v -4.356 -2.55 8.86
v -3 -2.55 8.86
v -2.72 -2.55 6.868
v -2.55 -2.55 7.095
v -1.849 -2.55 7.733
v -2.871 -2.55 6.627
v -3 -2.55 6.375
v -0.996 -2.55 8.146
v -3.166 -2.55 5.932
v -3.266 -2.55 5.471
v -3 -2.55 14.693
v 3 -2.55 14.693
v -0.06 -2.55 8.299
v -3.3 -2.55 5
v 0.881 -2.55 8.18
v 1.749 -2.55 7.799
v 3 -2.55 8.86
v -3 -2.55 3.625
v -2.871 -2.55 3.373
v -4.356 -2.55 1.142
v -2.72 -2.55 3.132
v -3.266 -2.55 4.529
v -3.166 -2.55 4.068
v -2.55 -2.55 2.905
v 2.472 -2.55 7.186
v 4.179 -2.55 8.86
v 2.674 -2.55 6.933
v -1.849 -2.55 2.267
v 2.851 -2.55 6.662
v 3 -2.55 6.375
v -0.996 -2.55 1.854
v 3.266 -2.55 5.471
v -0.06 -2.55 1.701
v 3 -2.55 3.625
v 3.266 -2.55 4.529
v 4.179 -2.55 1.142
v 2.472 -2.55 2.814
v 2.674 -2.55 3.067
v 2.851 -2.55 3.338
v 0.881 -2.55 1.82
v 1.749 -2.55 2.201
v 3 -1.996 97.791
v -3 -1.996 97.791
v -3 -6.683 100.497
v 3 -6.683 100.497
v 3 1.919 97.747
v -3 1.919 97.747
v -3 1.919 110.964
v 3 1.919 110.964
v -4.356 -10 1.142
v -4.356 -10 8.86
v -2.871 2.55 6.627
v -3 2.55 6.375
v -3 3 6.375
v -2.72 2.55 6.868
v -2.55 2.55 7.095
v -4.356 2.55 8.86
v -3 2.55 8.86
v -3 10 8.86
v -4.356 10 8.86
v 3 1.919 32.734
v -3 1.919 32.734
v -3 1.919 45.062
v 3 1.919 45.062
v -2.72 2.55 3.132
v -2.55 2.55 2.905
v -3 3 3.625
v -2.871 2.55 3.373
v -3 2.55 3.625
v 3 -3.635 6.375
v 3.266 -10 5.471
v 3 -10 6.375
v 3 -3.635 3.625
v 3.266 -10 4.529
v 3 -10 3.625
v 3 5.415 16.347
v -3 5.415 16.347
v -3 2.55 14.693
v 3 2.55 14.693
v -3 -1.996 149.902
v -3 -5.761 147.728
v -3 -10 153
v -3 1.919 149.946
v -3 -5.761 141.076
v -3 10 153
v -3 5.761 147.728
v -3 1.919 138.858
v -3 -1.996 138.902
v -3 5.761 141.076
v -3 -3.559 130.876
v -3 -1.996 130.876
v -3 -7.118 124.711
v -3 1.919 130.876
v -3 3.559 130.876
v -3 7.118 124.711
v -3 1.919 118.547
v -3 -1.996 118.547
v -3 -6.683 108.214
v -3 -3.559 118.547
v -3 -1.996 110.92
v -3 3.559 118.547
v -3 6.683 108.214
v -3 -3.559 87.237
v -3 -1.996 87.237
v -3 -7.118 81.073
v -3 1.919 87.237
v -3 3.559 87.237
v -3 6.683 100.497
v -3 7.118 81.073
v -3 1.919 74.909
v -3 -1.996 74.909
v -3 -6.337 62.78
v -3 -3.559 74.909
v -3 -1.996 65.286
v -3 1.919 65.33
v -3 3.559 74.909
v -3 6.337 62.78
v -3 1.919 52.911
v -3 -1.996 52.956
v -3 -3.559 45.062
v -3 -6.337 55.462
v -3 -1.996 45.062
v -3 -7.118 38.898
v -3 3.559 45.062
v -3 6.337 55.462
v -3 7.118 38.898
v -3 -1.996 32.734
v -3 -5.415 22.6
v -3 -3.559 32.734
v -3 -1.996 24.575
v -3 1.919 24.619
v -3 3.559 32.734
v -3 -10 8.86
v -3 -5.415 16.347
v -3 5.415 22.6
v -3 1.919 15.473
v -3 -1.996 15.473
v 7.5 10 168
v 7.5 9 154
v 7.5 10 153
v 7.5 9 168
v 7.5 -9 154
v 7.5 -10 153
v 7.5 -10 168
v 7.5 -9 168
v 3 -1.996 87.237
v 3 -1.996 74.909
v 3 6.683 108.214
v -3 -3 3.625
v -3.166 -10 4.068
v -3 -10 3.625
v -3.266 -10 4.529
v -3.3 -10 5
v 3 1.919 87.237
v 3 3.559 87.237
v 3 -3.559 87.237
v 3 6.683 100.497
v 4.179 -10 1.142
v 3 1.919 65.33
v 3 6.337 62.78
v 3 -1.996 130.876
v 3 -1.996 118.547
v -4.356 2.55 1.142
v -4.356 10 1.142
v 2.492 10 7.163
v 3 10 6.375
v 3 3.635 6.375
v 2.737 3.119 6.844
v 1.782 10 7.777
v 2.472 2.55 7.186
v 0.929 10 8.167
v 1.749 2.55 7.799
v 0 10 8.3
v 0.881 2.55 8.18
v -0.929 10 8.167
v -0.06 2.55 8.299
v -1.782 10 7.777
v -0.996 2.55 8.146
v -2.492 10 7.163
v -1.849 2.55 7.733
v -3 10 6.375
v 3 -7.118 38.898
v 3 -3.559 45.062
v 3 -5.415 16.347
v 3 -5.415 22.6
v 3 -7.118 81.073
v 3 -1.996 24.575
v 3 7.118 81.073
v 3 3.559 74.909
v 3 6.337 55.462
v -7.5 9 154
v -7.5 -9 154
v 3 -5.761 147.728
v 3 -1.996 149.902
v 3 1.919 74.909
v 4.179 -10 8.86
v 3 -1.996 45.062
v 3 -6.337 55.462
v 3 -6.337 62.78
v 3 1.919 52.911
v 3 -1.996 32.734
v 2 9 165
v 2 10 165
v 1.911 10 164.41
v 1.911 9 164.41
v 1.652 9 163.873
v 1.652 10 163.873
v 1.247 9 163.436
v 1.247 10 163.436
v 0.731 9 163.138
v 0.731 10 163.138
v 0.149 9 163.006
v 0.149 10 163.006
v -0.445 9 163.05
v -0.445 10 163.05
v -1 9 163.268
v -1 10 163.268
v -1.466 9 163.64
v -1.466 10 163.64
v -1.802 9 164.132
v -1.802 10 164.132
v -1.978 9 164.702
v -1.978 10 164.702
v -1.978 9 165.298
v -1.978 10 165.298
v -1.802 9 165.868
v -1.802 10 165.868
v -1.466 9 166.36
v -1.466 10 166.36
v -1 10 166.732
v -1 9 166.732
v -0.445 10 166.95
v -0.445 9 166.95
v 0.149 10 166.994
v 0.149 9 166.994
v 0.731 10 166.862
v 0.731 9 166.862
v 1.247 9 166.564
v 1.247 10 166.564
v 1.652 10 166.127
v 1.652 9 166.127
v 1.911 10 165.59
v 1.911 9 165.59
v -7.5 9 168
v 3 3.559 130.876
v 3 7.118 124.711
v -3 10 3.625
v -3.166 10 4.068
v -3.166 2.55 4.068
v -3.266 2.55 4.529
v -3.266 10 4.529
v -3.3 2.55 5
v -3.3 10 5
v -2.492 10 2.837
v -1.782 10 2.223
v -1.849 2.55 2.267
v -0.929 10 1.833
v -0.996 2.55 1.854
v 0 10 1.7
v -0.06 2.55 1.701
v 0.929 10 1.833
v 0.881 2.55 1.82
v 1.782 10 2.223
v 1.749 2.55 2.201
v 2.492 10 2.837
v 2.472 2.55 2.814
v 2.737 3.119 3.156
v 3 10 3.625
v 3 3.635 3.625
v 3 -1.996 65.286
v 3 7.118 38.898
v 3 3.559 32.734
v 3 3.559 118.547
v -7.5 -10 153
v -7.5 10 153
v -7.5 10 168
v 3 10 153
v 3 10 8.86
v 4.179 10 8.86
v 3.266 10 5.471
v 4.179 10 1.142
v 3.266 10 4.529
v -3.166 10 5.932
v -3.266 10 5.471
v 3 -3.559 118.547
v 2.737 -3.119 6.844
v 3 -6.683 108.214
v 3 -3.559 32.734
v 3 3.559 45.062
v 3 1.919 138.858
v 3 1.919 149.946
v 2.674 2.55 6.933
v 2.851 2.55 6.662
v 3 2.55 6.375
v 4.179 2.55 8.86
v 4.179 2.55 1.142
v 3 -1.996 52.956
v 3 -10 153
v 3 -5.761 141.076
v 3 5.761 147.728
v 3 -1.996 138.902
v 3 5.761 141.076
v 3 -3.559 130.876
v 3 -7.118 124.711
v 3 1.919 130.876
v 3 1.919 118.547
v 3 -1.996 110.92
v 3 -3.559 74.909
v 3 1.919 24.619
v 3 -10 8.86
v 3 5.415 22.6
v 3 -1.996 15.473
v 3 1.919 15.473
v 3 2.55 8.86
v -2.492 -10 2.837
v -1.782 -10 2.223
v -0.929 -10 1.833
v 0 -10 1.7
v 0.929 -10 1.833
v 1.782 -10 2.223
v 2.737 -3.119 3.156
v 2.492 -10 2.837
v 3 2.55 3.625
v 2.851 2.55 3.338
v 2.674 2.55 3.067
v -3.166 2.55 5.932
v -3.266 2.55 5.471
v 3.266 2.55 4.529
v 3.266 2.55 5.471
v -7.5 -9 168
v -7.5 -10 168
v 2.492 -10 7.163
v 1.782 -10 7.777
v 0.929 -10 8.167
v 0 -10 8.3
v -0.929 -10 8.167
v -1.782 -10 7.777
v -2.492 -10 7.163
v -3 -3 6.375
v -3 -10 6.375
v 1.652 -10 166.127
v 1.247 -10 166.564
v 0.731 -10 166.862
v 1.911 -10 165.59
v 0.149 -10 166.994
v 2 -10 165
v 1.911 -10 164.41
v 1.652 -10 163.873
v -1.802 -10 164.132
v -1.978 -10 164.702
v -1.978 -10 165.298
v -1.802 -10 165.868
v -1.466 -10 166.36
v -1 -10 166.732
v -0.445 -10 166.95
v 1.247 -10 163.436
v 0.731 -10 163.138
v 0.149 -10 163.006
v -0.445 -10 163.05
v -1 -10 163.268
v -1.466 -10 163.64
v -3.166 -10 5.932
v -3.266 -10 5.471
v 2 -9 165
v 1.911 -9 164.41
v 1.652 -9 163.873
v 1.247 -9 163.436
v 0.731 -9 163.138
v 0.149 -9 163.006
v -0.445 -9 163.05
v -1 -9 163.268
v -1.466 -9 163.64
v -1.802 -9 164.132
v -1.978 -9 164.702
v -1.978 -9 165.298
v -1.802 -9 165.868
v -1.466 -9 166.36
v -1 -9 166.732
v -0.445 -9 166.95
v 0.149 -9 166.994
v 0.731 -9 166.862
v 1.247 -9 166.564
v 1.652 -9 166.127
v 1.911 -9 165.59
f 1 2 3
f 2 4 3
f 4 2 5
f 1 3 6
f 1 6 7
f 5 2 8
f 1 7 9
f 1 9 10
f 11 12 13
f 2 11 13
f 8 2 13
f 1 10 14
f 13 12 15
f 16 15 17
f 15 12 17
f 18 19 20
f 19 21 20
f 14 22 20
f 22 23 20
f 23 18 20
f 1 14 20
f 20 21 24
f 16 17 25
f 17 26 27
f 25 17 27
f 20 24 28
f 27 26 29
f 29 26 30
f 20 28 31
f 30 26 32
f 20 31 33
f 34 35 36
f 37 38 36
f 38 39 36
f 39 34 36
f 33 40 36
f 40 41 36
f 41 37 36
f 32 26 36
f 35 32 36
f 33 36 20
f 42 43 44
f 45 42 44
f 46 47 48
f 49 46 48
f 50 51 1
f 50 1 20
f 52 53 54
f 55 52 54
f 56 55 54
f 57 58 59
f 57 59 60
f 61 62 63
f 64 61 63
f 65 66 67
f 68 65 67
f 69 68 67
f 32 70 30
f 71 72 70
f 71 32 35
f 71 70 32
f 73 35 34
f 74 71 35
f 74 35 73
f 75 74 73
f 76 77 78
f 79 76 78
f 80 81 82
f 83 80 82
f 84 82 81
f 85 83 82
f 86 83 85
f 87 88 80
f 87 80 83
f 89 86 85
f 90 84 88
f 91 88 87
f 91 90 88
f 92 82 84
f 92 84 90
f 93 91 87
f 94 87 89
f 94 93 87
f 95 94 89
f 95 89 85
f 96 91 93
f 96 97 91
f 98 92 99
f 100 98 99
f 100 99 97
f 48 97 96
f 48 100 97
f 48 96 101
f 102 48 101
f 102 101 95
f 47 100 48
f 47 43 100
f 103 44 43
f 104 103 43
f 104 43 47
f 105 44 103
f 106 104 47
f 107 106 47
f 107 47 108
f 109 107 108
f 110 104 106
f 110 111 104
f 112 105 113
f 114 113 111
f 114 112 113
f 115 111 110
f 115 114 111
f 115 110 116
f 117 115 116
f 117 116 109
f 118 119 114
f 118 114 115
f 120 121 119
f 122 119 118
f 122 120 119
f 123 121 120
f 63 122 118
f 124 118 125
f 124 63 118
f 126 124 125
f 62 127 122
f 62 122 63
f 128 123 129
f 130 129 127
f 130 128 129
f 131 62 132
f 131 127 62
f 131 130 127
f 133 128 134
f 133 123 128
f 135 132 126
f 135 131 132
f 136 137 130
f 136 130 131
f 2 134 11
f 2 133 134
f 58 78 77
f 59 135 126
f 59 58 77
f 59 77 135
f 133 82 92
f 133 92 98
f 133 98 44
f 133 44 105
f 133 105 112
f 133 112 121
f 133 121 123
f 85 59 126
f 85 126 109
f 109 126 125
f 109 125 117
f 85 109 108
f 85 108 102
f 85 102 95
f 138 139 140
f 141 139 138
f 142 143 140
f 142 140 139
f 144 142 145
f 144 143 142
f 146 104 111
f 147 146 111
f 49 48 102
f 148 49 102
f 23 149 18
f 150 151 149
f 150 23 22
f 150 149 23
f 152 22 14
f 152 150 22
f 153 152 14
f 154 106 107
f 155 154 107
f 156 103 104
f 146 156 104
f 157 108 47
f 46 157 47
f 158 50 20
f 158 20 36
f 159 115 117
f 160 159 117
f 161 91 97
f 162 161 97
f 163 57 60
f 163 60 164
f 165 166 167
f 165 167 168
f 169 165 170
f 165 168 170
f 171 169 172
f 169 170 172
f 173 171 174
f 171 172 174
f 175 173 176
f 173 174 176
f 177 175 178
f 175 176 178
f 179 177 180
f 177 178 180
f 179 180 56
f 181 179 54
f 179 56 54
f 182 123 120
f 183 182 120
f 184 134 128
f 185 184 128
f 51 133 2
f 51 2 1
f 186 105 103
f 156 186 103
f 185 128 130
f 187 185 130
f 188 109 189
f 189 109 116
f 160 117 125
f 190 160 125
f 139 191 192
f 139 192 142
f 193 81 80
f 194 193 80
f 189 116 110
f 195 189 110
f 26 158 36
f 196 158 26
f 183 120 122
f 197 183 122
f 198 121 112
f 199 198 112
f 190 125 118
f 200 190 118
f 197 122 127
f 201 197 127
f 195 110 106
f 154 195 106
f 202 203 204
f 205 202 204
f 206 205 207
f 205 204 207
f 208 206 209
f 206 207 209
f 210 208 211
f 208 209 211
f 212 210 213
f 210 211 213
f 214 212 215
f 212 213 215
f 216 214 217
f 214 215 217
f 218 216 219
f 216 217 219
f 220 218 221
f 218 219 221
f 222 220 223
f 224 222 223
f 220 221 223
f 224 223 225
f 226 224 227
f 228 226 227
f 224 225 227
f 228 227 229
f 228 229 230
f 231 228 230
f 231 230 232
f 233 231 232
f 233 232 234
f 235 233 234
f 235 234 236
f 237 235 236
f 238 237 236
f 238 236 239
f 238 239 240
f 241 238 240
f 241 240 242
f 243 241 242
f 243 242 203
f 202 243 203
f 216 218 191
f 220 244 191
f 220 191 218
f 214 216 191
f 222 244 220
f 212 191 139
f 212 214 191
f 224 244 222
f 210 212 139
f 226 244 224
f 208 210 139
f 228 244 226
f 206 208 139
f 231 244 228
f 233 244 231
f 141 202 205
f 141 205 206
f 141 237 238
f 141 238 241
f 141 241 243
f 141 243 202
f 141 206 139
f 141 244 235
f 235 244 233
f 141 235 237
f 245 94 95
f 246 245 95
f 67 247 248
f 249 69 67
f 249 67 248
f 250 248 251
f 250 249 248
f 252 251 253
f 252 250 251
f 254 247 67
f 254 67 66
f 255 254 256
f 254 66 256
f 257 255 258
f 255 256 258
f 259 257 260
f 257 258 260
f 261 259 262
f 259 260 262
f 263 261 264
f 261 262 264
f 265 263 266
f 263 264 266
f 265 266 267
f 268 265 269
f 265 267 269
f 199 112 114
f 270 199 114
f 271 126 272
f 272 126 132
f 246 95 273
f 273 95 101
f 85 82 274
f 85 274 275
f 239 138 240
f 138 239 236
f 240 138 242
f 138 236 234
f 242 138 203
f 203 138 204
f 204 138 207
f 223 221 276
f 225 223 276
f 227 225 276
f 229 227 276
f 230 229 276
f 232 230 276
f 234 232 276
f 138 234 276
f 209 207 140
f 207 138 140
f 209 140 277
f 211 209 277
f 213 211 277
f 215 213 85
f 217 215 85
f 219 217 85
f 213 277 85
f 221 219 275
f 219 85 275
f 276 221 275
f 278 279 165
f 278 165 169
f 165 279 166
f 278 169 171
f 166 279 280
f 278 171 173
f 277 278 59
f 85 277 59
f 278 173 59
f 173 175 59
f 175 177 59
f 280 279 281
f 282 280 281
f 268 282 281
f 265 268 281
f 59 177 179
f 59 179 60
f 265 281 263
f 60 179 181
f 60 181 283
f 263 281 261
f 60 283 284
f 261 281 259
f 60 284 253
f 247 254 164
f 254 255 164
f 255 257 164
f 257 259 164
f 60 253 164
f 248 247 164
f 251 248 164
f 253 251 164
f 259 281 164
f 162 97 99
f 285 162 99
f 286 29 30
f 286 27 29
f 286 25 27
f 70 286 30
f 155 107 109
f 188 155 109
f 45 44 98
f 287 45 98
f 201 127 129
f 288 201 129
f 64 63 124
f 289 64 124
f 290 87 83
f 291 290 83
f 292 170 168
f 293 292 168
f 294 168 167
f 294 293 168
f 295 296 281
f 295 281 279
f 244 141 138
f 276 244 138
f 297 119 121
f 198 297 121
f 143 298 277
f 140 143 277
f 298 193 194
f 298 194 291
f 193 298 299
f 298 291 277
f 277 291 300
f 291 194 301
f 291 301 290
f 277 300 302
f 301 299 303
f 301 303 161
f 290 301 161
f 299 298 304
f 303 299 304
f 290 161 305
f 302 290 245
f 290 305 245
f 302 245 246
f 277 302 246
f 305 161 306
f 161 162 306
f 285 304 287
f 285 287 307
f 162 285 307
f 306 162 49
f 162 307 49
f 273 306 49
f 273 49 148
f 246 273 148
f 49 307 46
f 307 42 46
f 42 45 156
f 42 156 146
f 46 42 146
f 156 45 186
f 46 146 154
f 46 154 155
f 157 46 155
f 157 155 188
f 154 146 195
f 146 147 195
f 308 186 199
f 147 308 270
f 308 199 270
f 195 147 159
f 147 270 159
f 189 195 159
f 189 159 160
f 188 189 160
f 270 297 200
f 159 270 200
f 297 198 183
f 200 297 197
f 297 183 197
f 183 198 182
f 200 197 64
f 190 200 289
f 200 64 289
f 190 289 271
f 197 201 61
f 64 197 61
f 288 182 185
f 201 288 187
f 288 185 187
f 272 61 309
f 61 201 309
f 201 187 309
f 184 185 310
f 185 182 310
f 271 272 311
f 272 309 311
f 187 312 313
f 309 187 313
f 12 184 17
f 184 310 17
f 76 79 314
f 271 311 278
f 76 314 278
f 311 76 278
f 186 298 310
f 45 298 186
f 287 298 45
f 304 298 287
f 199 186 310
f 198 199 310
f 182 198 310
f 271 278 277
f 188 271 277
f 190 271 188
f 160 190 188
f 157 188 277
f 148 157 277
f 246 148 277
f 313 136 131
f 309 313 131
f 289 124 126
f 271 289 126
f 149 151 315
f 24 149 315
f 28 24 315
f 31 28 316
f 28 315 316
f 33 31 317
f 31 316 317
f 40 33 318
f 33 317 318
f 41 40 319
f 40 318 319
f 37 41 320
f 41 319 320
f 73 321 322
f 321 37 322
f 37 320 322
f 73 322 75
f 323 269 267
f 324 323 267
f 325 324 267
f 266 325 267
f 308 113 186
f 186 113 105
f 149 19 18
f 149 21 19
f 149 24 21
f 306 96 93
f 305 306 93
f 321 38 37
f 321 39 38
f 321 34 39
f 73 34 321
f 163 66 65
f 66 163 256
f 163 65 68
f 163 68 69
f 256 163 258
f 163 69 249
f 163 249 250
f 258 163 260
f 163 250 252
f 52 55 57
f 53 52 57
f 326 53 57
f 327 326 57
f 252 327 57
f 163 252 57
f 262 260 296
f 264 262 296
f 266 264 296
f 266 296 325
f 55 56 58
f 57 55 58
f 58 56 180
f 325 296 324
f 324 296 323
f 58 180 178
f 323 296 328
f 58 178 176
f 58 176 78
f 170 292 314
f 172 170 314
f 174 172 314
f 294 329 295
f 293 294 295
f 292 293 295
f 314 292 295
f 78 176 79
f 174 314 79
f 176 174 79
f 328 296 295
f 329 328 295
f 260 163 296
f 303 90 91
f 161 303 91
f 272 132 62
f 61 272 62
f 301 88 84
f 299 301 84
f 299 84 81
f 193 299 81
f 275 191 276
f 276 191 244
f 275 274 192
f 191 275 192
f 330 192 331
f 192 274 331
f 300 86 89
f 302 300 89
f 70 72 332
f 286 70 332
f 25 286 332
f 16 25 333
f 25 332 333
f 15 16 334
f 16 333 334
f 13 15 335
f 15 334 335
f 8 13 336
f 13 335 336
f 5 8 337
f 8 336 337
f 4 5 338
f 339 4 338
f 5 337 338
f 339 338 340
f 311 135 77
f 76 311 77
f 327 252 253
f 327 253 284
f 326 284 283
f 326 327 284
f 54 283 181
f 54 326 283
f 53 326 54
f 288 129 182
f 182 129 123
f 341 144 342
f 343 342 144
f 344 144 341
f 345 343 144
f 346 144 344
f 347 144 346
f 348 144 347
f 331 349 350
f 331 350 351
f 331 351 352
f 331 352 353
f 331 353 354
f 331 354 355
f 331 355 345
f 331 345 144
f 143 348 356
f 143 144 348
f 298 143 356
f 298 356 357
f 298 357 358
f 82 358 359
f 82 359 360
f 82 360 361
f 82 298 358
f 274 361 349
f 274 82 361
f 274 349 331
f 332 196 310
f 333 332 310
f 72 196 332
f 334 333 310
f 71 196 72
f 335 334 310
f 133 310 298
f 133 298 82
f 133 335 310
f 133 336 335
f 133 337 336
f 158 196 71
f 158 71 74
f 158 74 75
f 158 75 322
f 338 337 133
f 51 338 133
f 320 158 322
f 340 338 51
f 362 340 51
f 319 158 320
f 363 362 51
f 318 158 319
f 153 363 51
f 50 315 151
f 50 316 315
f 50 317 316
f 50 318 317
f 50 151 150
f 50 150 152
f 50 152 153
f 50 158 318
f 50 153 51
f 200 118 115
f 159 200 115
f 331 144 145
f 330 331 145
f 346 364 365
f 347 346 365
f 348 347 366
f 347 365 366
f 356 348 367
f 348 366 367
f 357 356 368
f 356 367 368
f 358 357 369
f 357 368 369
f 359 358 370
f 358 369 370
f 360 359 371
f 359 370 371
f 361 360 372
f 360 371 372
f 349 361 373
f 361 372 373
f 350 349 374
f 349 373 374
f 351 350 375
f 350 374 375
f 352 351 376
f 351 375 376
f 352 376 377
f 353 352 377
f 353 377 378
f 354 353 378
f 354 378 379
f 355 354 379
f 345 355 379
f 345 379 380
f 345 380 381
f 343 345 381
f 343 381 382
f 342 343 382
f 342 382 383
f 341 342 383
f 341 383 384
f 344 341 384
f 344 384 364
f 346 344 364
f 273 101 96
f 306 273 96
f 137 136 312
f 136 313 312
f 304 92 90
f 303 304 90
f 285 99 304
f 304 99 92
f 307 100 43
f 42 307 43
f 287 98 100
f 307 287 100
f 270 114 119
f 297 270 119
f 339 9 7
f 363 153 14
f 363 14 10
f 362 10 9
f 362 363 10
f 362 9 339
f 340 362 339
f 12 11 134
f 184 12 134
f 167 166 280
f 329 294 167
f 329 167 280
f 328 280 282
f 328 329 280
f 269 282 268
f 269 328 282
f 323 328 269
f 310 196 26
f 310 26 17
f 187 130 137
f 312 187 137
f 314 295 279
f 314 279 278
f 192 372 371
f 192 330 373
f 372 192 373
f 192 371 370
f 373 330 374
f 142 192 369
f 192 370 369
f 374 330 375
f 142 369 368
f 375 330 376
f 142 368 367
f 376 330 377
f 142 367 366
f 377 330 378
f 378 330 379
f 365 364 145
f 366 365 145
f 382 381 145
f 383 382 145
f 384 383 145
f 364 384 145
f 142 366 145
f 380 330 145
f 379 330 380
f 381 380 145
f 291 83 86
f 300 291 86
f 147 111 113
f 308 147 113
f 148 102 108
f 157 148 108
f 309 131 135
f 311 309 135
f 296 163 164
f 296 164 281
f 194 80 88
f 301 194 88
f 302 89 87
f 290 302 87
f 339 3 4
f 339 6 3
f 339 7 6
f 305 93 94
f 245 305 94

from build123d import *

# Parameters (mm, degrees)
SKETCH_1_W                      = 6
SKETCH_1_H                      = 20
EXTRUDE_1_DEPTH                 = 165
HOLE_WIZARD_G1_16_1_D           = 6.6
HOLE_WIZARD_G1_16_1_DEPTH       = 50
HOLE_WIZARD_G1_16_1_CSINK_D     = 7.773
HOLE_WIZARD_G1_16_1_CSINK_ANGLE = 90
HOLE_WIZARD_G1_16_1_TIP         = 1.982840043
EXTRUDE_2_DEPTH                 = 10
EXTRUDE_2_DEPTH_BACK            = 15
SKETCH_5_W                      = 15
SKETCH_5_H                      = 20
SKETCH_6_W                      = 4.5
SKETCH_6_H                      = 15
SKETCH_6_W_2                    = 5.5
CUT_EXTRUDE_1_DEPTH             = 32
SKETCH_7_W                      = 15
SKETCH_7_H                      = 18
CUT_EXTRUDE_2_DEPTH             = 14
SKETCH_8_R                      = 2
CUT_EXTRUDE_3_DEPTH             = 39
CUT_EXTRUDE_4_DEPTH             = 70
SKETCH_11_W                     = 8.534743408
SKETCH_11_H                     = 7.718624342
SKETCH_11_R                     = 3.3
EXTRUDE_3_DEPTH                 = 20
SKETCH_11_5_W                   = 6
SKETCH_11_5_H                   = 1.141567996
CUT_EXTRUDE_5_DEPTH             = 20
SKETCH_13_W                     = 14.331495705
SKETCH_13_H                     = 5.1
CUT_EXTRUDE_6_DEPTH             = 20


with BuildPart() as part:
    # 草图1 → 凸台-拉伸1 (new body)
    with BuildSketch(Plane.XY):
        Rectangle(SKETCH_1_W, SKETCH_1_H)
    extrude(amount=EXTRUDE_1_DEPTH)

    # G1/16 螺纹孔1
    with Locations(Plane(origin=(3, 0, 0), x_dir=(0, 0, -1), z_dir=(1, 0, 0))):
        with Locations((-5, 0)):
            CounterSinkHole(HOLE_WIZARD_G1_16_1_D / 2, HOLE_WIZARD_G1_16_1_CSINK_D / 2, depth=HOLE_WIZARD_G1_16_1_DEPTH, counter_sink_angle=HOLE_WIZARD_G1_16_1_CSINK_ANGLE)
            with Locations((0, 0, -(HOLE_WIZARD_G1_16_1_DEPTH + HOLE_WIZARD_G1_16_1_TIP / 2))):  # 118° drill point
                Cone(0, HOLE_WIZARD_G1_16_1_D / 2, HOLE_WIZARD_G1_16_1_TIP, mode=Mode.SUBTRACT)

    # 草图5 → 凸台-拉伸2 (add, two sides: drawn at the far end of the back side and taken through both)
    with BuildSketch(Plane(origin=(3, 0, 0), x_dir=(0, 0, -1), z_dir=(1, 0, 0)).offset(-EXTRUDE_2_DEPTH_BACK)):
        with Locations((-160.5, 0)):
            Rectangle(SKETCH_5_W, SKETCH_5_H)
    extrude(amount=EXTRUDE_2_DEPTH + EXTRUDE_2_DEPTH_BACK)

    # 草图6 → 切除-拉伸1 (cut)
    with BuildSketch(Plane.XZ.offset(10)):
        with Locations((-9.75, 160.5)):
            Rectangle(SKETCH_6_W, SKETCH_6_H)
        with Locations((10.25, 160.5)):
            Rectangle(SKETCH_6_W_2, SKETCH_6_H)
    extrude(amount=-CUT_EXTRUDE_1_DEPTH, mode=Mode.SUBTRACT)

    # 草图7 → 切除-拉伸2 (cut)
    with BuildSketch(Plane.XY.offset(168)):
        Rectangle(SKETCH_7_W, SKETCH_7_H)
    extrude(amount=-CUT_EXTRUDE_2_DEPTH, mode=Mode.SUBTRACT)

    # 草图8 → 切除-拉伸3 (cut)
    with BuildSketch(Plane(origin=(0, 10, 0), x_dir=(1, 0, 0), z_dir=(0, 1, 0))):
        with Locations((0, -165)):
            Circle(SKETCH_8_R)
    extrude(amount=-CUT_EXTRUDE_3_DEPTH, mode=Mode.SUBTRACT)

    # 草图9 → 切除-拉伸4 (cut)
    with BuildSketch(Plane.ZY.offset(3)):
        Polygon((138.857505266, 1.918732887), (149.946330576, 1.918732887), (147.728014723, 5.760968652), (141.075821119, 5.760968652), align=None)
        Polygon((147.728014723, -5.760968652), (149.901985563, -1.995540703), (138.901850279, -1.995540703), (141.075821119, -5.760968652), align=None)
        Polygon((118.547188397, 1.918732887), (130.875661312, 1.918732887), (130.875661312, 3.558923578), (124.711424854, 7.117847156), (118.547188397, 3.558923578), align=None)
        Polygon((130.875661312, -3.558923578), (130.875661312, -1.995540703), (118.547188397, -1.995540703), (118.547188397, -3.558923578), (124.711424854, -7.117847156), align=None)
        Polygon((97.746948796, 1.918732887), (110.964476059, 1.918732887), (108.213984717, 6.682723636), (100.497440137, 6.682723636), align=None)
        Polygon((108.213984717, -6.682723636), (110.920131045, -1.995540703), (97.791293809, -1.995540703), (100.497440137, -6.682723636), align=None)
        Polygon((74.908798357, 1.918732887), (87.237271272, 1.918732887), (87.237271272, 3.558923578), (81.073034814, 7.117847156), (74.908798357, 3.558923578), align=None)
        Polygon((87.237271272, -3.558923578), (87.237271272, -1.995540703), (74.908798357, -1.995540703), (74.908798357, -3.558923578), (81.073034814, -7.117847156), align=None)
        Polygon((52.911163907, 1.918732887), (65.330427938, 1.918732887), (62.779502404, 6.337065517), (55.46208944, 6.337065517), align=None)
        Polygon((62.779502404, -6.337065517), (65.286082924, -1.995540703), (52.95550892, -1.995540703), (55.46208944, -6.337065517), align=None)
        Polygon((32.73389091, 1.918732887), (45.062363825, 1.918732887), (45.062363825, 3.558923578), (38.898127367, 7.117847156), (32.73389091, 3.558923578), align=None)
        Polygon((45.062363825, -3.558923578), (45.062363825, -1.995540703), (32.73389091, -1.995540703), (32.73389091, -3.558923578), (38.898127367, -7.117847156), align=None)
        Polygon((14.328441006, 1.918732887), (24.619003084, 1.918732887), (22.600253038, 5.415310533), (16.347191051, 5.415310533), align=None)
        Polygon((22.600253038, -5.415310533), (24.57465807, -1.995540703), (14.372786019, -1.995540703), (16.347191051, -5.415310533), align=None)
    extrude(amount=-CUT_EXTRUDE_4_DEPTH, mode=Mode.SUBTRACT)

    # 草图11 → 凸台-拉伸3 (add)
    with BuildSketch(Plane(origin=(0, -10, 0), x_dir=(-1, 0, 0), z_dir=(0, -1, 0))):
        with Locations((0.088721547, -5.000880167)):
            Rectangle(SKETCH_11_W, SKETCH_11_H)
        with Locations((0, -5)):
            Circle(SKETCH_11_R, mode=Mode.SUBTRACT)
    extrude(amount=-EXTRUDE_3_DEPTH)

    # 草图11<5> → 切除-拉伸5 (cut)
    with BuildSketch(Plane(origin=(0, -10, 0), x_dir=(-1, 0, 0), z_dir=(0, -1, 0))):
        with Locations((0, -0.570783998)):
            Rectangle(SKETCH_11_5_W, SKETCH_11_5_H)
        with BuildLine():
            Line((3, -6.374772708), (3, -3.625227292))
            ThreePointArc((3, -3.625227292), (0, -1.7), (-3, -3.625227292))
            Line((-3, -3.625227292), (-3, -6.374772708))
            ThreePointArc((-3, -6.374772708), (0, -8.3), (3, -6.374772708))
        make_face()
    extrude(amount=-CUT_EXTRUDE_5_DEPTH, mode=Mode.SUBTRACT)

    # 草图13 → 切除-拉伸6 (cut)
    with BuildSketch(Plane(origin=(4.178650157, 0, 0), x_dir=(0, 0, -1), z_dir=(1, 0, 0))):
        with Locations((-8.307315849, 0)):
            Rectangle(SKETCH_13_W, SKETCH_13_H)
    extrude(amount=-CUT_EXTRUDE_6_DEPTH, mode=Mode.SUBTRACT)


solid = part.part
